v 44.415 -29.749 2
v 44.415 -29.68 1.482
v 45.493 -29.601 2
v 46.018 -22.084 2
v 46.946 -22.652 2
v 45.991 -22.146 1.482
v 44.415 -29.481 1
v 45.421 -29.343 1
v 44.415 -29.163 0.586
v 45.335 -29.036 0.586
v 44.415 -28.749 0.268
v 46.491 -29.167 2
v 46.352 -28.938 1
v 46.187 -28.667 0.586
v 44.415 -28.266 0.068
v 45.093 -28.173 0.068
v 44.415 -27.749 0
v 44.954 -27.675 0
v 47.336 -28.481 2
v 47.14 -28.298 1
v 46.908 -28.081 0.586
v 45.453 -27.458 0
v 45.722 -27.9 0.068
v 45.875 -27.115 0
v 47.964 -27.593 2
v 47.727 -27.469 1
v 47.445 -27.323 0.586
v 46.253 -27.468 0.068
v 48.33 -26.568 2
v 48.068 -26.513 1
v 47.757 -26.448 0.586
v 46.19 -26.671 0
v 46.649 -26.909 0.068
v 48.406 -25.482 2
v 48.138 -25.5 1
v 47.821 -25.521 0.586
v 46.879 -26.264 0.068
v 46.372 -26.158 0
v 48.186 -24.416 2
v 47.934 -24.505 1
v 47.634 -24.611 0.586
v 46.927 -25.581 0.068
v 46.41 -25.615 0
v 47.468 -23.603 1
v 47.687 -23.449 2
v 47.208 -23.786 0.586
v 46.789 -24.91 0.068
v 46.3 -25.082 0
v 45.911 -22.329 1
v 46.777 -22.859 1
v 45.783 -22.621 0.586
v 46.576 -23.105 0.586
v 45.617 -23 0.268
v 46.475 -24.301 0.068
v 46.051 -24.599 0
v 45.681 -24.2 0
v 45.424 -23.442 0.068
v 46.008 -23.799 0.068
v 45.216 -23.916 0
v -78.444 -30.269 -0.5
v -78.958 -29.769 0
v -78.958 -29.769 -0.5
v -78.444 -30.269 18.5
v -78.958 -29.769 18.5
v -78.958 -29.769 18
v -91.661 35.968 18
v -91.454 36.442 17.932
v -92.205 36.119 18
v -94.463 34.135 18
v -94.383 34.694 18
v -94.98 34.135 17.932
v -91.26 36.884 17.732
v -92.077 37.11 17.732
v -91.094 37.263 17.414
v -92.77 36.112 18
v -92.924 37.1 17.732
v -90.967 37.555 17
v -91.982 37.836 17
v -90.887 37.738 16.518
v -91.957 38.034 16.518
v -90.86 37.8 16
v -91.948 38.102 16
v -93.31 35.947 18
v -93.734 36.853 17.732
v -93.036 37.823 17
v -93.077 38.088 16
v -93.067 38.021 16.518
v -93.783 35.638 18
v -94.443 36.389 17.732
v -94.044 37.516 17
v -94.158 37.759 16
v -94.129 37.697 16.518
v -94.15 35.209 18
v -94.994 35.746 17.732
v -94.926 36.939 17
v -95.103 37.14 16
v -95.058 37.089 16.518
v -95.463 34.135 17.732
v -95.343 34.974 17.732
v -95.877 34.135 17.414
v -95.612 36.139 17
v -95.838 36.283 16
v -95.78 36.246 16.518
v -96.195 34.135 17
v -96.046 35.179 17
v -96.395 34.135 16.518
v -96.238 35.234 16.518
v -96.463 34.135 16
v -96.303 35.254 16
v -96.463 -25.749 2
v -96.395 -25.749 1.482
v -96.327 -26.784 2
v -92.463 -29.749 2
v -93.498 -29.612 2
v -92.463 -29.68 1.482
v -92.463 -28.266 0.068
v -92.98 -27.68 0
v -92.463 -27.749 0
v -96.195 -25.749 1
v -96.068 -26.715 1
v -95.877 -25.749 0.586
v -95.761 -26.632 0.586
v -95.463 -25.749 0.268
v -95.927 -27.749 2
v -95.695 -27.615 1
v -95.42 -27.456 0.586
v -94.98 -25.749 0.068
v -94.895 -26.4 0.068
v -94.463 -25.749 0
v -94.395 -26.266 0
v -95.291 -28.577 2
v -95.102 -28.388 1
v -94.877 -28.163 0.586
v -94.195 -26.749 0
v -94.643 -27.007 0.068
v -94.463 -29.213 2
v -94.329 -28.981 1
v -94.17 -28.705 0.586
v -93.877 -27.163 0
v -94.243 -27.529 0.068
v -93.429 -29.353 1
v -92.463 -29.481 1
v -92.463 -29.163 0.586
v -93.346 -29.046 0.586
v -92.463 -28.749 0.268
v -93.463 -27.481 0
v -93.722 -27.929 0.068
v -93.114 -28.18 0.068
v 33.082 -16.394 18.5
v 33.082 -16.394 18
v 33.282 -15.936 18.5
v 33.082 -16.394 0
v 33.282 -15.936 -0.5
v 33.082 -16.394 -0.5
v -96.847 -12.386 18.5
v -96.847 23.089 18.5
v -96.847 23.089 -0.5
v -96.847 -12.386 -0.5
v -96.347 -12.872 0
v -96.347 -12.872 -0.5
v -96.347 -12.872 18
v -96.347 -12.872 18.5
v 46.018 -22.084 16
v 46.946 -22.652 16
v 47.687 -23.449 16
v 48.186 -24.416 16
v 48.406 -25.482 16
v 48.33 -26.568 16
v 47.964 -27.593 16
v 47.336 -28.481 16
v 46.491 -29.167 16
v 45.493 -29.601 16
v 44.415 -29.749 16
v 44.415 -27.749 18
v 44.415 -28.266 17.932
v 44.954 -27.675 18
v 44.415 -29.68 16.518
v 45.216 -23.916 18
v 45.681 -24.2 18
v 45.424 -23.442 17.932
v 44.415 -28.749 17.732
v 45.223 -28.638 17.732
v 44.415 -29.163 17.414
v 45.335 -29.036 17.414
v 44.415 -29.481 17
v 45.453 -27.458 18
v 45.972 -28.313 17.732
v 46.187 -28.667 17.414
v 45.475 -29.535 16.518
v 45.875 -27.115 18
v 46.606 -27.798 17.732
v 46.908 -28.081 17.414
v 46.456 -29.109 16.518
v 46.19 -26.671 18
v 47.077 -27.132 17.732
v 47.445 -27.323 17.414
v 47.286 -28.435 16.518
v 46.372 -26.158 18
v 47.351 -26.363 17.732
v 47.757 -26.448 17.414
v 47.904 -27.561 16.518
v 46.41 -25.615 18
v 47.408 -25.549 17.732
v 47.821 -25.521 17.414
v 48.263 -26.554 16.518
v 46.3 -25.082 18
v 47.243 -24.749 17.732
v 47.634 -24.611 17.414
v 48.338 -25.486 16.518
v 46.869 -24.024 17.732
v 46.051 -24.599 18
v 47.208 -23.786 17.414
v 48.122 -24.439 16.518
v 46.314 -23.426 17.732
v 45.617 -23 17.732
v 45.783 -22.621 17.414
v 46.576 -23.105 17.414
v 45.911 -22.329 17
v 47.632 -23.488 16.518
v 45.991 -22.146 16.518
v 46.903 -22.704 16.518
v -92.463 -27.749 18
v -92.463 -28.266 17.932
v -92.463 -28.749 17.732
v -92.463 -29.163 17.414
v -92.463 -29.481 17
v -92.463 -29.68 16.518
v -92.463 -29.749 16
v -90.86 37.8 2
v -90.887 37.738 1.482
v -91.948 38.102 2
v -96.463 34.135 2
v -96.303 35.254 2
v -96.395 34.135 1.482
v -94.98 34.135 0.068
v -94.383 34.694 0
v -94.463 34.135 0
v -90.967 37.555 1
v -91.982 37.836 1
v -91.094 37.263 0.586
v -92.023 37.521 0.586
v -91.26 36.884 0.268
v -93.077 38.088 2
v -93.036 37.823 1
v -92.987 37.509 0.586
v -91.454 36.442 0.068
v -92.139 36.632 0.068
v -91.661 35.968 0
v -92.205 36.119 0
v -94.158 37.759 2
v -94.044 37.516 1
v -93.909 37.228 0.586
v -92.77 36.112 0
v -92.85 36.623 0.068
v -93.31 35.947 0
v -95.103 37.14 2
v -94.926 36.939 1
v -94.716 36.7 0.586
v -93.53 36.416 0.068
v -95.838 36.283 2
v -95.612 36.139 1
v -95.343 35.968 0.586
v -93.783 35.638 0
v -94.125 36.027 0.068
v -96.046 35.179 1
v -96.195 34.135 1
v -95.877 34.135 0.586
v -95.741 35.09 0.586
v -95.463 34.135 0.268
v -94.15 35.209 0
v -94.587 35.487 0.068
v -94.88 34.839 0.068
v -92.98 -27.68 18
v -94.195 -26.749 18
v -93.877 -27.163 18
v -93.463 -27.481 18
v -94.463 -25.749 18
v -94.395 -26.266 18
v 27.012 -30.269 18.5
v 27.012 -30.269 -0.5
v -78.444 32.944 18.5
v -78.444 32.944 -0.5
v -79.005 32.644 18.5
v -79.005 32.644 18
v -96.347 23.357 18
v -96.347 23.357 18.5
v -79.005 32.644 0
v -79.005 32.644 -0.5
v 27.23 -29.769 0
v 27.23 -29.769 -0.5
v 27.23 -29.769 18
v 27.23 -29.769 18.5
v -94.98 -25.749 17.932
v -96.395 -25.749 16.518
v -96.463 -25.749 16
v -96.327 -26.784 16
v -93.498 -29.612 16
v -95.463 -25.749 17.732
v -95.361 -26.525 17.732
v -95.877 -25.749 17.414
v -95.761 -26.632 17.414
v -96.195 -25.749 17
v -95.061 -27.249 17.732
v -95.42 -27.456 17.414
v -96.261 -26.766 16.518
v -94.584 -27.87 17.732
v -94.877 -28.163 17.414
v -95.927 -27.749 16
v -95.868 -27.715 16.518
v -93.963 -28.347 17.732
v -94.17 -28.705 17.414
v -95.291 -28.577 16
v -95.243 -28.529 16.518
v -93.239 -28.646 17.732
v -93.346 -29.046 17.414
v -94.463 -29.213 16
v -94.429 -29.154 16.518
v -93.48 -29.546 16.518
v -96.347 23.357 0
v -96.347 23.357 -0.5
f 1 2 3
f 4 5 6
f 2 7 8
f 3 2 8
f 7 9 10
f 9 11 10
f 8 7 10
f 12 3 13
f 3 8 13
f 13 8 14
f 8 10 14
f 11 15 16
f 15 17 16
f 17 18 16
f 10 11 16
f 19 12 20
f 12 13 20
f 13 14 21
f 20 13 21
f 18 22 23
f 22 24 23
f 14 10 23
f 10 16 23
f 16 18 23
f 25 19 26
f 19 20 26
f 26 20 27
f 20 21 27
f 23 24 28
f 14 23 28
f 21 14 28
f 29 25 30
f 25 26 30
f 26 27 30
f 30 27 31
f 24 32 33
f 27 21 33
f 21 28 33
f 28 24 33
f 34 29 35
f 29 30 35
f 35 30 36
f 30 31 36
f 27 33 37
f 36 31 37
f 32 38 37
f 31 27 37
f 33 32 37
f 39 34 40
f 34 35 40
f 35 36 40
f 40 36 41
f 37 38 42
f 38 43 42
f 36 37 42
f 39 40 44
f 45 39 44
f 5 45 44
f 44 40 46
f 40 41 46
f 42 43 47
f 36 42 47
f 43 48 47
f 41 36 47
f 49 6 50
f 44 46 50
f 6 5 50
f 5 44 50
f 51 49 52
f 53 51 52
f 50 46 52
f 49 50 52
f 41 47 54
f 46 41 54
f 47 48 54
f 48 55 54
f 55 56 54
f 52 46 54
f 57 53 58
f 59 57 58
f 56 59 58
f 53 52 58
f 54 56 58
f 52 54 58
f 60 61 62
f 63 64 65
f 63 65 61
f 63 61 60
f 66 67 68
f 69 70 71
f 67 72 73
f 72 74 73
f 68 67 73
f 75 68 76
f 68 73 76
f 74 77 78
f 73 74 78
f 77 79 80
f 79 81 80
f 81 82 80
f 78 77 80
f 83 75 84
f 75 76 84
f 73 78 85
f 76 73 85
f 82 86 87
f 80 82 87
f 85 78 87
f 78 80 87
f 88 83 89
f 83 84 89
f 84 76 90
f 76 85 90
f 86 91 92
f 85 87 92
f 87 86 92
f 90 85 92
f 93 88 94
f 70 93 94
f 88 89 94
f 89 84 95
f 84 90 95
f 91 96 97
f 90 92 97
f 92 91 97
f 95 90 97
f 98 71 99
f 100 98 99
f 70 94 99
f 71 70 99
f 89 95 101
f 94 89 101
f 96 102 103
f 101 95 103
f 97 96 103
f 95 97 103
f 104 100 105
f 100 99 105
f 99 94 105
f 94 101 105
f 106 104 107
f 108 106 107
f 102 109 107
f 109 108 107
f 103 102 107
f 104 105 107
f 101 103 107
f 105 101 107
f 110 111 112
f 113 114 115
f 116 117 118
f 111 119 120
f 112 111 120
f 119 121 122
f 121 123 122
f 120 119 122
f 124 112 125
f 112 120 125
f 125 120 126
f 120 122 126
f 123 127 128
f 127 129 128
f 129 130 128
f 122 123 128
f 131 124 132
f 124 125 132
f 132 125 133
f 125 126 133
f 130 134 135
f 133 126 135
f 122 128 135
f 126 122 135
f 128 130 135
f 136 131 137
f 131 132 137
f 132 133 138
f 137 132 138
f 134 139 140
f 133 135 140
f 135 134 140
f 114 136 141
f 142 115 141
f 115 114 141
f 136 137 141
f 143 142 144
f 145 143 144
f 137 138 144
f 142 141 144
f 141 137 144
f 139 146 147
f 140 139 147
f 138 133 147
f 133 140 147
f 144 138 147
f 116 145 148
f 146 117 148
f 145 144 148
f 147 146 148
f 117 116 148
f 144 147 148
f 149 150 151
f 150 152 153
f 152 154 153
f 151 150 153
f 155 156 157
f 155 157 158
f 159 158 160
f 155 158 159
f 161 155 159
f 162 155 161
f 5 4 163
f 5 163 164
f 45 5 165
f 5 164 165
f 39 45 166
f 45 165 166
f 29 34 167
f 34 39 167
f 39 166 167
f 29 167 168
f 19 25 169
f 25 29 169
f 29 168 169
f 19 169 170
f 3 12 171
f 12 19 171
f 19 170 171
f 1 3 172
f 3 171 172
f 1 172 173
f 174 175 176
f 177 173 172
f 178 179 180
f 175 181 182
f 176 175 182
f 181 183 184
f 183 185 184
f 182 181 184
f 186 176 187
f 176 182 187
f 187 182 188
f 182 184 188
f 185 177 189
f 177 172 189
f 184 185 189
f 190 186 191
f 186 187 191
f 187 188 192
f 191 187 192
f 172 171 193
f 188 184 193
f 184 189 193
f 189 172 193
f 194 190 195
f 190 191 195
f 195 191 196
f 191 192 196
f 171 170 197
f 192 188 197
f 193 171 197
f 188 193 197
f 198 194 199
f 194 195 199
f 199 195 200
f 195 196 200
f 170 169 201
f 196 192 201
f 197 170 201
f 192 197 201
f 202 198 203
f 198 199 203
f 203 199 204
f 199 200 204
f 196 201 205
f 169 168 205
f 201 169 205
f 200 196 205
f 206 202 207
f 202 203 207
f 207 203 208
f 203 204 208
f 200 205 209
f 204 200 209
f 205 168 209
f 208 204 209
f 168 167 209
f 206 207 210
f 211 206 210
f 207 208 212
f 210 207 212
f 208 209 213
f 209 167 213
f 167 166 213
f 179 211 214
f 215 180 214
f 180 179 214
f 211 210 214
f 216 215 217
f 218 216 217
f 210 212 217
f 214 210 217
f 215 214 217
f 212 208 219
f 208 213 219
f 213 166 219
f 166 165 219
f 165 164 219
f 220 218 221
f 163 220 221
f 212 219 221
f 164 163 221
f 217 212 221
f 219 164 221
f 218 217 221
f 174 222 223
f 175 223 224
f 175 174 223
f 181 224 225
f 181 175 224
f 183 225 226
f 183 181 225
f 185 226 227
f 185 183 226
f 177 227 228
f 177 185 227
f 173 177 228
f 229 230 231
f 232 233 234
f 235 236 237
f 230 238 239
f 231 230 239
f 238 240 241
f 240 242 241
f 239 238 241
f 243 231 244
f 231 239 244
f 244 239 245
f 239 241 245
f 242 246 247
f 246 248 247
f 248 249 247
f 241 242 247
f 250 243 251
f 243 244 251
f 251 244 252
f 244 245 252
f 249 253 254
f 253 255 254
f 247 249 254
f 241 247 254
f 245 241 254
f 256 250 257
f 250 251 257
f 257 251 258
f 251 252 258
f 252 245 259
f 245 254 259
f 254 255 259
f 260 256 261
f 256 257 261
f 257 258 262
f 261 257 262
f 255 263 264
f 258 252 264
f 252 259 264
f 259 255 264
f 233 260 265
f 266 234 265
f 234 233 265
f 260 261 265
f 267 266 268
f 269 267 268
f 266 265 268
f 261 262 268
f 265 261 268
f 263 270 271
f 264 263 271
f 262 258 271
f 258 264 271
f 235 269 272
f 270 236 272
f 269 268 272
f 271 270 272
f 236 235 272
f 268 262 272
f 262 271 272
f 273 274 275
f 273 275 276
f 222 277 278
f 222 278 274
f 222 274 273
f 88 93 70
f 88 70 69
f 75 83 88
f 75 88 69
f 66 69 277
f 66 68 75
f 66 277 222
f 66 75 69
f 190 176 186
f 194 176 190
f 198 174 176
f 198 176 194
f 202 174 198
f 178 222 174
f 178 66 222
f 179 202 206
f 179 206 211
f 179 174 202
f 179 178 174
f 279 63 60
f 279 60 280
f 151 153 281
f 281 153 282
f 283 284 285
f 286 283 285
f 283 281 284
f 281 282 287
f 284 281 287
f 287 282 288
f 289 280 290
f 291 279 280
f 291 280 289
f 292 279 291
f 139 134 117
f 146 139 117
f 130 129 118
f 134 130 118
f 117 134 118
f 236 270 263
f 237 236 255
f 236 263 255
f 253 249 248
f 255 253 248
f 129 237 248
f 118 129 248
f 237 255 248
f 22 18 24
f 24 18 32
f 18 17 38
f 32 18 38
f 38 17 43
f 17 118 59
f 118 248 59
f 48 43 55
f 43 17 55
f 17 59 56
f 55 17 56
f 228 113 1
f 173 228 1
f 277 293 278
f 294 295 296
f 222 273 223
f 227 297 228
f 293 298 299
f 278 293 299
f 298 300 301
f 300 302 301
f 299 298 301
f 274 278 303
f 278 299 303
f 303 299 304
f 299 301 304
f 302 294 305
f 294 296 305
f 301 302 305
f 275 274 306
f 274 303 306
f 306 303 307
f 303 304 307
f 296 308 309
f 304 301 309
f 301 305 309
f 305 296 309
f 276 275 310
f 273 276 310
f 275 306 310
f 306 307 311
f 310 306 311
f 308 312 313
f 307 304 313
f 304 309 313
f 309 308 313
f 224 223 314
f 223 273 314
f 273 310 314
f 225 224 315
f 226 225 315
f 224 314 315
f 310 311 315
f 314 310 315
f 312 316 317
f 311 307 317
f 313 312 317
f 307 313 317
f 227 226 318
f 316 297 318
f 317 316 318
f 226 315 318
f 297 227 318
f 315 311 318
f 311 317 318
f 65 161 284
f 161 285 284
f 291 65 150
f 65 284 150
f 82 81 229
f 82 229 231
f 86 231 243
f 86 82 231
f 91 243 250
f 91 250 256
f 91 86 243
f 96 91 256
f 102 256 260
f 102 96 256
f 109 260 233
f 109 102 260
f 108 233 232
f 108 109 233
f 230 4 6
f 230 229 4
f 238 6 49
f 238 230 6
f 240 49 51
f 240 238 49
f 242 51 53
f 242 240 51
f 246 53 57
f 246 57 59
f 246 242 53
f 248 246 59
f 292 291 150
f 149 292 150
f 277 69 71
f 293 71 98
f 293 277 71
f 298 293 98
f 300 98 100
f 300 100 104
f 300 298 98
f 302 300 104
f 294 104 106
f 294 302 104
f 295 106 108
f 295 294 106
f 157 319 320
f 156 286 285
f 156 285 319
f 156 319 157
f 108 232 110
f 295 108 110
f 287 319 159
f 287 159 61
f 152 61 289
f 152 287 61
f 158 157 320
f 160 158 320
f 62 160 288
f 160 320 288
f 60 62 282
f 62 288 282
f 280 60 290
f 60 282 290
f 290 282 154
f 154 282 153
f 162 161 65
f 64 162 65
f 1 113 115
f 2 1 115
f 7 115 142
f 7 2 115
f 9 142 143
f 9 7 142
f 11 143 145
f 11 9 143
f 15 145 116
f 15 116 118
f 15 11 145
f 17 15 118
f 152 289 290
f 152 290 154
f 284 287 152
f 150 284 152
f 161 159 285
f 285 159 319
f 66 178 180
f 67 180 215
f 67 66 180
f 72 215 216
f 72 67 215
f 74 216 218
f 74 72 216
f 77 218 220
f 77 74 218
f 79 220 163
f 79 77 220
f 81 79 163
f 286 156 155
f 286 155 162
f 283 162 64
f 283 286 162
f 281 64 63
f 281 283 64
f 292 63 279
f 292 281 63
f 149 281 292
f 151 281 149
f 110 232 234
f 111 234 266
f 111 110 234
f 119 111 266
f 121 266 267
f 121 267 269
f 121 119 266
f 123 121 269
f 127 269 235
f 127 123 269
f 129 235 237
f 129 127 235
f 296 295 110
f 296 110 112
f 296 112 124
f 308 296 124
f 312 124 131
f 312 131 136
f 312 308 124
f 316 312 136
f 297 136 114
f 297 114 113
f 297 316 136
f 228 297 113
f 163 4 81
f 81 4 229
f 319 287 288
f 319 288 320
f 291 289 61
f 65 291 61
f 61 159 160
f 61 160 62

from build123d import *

# Parameters (mm, degrees)
F2_DEPTH = 18
F3_START = 18
F3_DEPTH = 0.5
F4_DEPTH = 0.5
F5_DEPTH = 18
F6_R     = 4
F7_R     = 2


with BuildPart() as f2:
    # F0 (on Top) → F2 (new body)
    with BuildSketch(Plane.XY):
        Polygon((63.5371690989, -29.7485813498), (-96.4628309011, 40.2514186502), (-96.4628309011, -29.7485813498), align=None)
    extrude(amount=F2_DEPTH)

    # F6
    f6_edges = [f2.edges().sort_by_distance(p)[0] for p in [
        (63.537169, -29.748581, 9),
        (-96.462831, 40.251419, 9),
        (-96.462831, -29.748581, 9),
    ]]
    fillet(f6_edges, radius=F6_R)

    # F7
    f7_edges = [f2.edges().sort_by_distance(p)[0] for p in [
        (-96.462831, 4.193388, 18),
        (-24.024045, -29.748581, 18),
        (-95.291258, -28.577008, 18),
        (48.330001, -26.567569, 18),
        (-22.42077, 7.858017, 18),
        (-94.652226, 37.482975, 18),
        (-22.42077, 7.858017, 0),
        (-94.652226, 37.482975, 0),
        (-96.462831, 4.193388, 0),
        (-95.291258, -28.577008, 0),
        (-24.024045, -29.748581, 0),
        (48.330001, -26.567569, 0),
    ]]
    fillet(f7_edges, radius=F7_R)


with BuildPart() as f3:
    # F1 (on Top) → F3 (new body)
    with BuildSketch(Plane.XY.offset(F3_START)):
        Polygon((27.2303114762, -29.7686234117), (-78.958476275, -29.7686234117), (-78.4439082405, -30.2686234117), (27.0115614762, -30.2686234117), align=None)
        Polygon((-78.4439082405, 32.9444158173), (-79.0047962132, 32.644046518), (33.0817828051, -16.3938318026), (33.2821922221, -15.9357531351), align=None)
        Polygon((-79.0047962132, 32.644046518), (-96.3472649455, 23.3567281295), (-96.3472649455, -12.8721320786), (-78.958476275, -29.7686234117), (27.2303114762, -29.7686234117), (33.0817828051, -16.3938318026), align=None)
        Polygon((-96.3472649455, -12.8721320786), (-96.3472649455, 23.3567281295), (-96.8472649455, 23.0889658365), (-96.8472649455, -12.3862876747), align=None)
    extrude(amount=F3_DEPTH)



with BuildPart() as f4:
    # F1 (on Top) → F4 (new body)
    with BuildSketch(Plane.XY):
        Polygon((-79.0047962132, 32.644046518), (-96.3472649455, 23.3567281295), (-96.3472649455, -12.8721320786), (-78.958476275, -29.7686234117), (27.2303114762, -29.7686234117), (33.0817828051, -16.3938318026), align=None)
        Polygon((-96.3472649455, -12.8721320786), (-96.3472649455, 23.3567281295), (-96.8472649455, 23.0889658365), (-96.8472649455, -12.3862876747), align=None)
        Polygon((-78.4439082405, 32.9444158173), (-79.0047962132, 32.644046518), (33.0817828051, -16.3938318026), (33.2821922221, -15.9357531351), align=None)
        Polygon((27.2303114762, -29.7686234117), (-78.958476275, -29.7686234117), (-78.4439082405, -30.2686234117), (27.0115614762, -30.2686234117), align=None)
    extrude(amount=-F4_DEPTH)


with BuildPart() as f3_1:
    add(f3.part)

    add(f4.part)  # F5 merges F4
    # F1 (on Top) → F5 (join)
    with BuildSketch(Plane.XY):
        Polygon((-78.4439082405, 32.9444158173), (-79.0047962132, 32.644046518), (33.0817828051, -16.3938318026), (33.2821922221, -15.9357531351), align=None)
        Polygon((-96.3472649455, -12.8721320786), (-96.3472649455, 23.3567281295), (-96.8472649455, 23.0889658365), (-96.8472649455, -12.3862876747), align=None)
        Polygon((27.2303114762, -29.7686234117), (-78.958476275, -29.7686234117), (-78.4439082405, -30.2686234117), (27.0115614762, -30.2686234117), align=None)
    extrude(amount=F5_DEPTH)


solid = Compound([f2.part, f3_1.part])
